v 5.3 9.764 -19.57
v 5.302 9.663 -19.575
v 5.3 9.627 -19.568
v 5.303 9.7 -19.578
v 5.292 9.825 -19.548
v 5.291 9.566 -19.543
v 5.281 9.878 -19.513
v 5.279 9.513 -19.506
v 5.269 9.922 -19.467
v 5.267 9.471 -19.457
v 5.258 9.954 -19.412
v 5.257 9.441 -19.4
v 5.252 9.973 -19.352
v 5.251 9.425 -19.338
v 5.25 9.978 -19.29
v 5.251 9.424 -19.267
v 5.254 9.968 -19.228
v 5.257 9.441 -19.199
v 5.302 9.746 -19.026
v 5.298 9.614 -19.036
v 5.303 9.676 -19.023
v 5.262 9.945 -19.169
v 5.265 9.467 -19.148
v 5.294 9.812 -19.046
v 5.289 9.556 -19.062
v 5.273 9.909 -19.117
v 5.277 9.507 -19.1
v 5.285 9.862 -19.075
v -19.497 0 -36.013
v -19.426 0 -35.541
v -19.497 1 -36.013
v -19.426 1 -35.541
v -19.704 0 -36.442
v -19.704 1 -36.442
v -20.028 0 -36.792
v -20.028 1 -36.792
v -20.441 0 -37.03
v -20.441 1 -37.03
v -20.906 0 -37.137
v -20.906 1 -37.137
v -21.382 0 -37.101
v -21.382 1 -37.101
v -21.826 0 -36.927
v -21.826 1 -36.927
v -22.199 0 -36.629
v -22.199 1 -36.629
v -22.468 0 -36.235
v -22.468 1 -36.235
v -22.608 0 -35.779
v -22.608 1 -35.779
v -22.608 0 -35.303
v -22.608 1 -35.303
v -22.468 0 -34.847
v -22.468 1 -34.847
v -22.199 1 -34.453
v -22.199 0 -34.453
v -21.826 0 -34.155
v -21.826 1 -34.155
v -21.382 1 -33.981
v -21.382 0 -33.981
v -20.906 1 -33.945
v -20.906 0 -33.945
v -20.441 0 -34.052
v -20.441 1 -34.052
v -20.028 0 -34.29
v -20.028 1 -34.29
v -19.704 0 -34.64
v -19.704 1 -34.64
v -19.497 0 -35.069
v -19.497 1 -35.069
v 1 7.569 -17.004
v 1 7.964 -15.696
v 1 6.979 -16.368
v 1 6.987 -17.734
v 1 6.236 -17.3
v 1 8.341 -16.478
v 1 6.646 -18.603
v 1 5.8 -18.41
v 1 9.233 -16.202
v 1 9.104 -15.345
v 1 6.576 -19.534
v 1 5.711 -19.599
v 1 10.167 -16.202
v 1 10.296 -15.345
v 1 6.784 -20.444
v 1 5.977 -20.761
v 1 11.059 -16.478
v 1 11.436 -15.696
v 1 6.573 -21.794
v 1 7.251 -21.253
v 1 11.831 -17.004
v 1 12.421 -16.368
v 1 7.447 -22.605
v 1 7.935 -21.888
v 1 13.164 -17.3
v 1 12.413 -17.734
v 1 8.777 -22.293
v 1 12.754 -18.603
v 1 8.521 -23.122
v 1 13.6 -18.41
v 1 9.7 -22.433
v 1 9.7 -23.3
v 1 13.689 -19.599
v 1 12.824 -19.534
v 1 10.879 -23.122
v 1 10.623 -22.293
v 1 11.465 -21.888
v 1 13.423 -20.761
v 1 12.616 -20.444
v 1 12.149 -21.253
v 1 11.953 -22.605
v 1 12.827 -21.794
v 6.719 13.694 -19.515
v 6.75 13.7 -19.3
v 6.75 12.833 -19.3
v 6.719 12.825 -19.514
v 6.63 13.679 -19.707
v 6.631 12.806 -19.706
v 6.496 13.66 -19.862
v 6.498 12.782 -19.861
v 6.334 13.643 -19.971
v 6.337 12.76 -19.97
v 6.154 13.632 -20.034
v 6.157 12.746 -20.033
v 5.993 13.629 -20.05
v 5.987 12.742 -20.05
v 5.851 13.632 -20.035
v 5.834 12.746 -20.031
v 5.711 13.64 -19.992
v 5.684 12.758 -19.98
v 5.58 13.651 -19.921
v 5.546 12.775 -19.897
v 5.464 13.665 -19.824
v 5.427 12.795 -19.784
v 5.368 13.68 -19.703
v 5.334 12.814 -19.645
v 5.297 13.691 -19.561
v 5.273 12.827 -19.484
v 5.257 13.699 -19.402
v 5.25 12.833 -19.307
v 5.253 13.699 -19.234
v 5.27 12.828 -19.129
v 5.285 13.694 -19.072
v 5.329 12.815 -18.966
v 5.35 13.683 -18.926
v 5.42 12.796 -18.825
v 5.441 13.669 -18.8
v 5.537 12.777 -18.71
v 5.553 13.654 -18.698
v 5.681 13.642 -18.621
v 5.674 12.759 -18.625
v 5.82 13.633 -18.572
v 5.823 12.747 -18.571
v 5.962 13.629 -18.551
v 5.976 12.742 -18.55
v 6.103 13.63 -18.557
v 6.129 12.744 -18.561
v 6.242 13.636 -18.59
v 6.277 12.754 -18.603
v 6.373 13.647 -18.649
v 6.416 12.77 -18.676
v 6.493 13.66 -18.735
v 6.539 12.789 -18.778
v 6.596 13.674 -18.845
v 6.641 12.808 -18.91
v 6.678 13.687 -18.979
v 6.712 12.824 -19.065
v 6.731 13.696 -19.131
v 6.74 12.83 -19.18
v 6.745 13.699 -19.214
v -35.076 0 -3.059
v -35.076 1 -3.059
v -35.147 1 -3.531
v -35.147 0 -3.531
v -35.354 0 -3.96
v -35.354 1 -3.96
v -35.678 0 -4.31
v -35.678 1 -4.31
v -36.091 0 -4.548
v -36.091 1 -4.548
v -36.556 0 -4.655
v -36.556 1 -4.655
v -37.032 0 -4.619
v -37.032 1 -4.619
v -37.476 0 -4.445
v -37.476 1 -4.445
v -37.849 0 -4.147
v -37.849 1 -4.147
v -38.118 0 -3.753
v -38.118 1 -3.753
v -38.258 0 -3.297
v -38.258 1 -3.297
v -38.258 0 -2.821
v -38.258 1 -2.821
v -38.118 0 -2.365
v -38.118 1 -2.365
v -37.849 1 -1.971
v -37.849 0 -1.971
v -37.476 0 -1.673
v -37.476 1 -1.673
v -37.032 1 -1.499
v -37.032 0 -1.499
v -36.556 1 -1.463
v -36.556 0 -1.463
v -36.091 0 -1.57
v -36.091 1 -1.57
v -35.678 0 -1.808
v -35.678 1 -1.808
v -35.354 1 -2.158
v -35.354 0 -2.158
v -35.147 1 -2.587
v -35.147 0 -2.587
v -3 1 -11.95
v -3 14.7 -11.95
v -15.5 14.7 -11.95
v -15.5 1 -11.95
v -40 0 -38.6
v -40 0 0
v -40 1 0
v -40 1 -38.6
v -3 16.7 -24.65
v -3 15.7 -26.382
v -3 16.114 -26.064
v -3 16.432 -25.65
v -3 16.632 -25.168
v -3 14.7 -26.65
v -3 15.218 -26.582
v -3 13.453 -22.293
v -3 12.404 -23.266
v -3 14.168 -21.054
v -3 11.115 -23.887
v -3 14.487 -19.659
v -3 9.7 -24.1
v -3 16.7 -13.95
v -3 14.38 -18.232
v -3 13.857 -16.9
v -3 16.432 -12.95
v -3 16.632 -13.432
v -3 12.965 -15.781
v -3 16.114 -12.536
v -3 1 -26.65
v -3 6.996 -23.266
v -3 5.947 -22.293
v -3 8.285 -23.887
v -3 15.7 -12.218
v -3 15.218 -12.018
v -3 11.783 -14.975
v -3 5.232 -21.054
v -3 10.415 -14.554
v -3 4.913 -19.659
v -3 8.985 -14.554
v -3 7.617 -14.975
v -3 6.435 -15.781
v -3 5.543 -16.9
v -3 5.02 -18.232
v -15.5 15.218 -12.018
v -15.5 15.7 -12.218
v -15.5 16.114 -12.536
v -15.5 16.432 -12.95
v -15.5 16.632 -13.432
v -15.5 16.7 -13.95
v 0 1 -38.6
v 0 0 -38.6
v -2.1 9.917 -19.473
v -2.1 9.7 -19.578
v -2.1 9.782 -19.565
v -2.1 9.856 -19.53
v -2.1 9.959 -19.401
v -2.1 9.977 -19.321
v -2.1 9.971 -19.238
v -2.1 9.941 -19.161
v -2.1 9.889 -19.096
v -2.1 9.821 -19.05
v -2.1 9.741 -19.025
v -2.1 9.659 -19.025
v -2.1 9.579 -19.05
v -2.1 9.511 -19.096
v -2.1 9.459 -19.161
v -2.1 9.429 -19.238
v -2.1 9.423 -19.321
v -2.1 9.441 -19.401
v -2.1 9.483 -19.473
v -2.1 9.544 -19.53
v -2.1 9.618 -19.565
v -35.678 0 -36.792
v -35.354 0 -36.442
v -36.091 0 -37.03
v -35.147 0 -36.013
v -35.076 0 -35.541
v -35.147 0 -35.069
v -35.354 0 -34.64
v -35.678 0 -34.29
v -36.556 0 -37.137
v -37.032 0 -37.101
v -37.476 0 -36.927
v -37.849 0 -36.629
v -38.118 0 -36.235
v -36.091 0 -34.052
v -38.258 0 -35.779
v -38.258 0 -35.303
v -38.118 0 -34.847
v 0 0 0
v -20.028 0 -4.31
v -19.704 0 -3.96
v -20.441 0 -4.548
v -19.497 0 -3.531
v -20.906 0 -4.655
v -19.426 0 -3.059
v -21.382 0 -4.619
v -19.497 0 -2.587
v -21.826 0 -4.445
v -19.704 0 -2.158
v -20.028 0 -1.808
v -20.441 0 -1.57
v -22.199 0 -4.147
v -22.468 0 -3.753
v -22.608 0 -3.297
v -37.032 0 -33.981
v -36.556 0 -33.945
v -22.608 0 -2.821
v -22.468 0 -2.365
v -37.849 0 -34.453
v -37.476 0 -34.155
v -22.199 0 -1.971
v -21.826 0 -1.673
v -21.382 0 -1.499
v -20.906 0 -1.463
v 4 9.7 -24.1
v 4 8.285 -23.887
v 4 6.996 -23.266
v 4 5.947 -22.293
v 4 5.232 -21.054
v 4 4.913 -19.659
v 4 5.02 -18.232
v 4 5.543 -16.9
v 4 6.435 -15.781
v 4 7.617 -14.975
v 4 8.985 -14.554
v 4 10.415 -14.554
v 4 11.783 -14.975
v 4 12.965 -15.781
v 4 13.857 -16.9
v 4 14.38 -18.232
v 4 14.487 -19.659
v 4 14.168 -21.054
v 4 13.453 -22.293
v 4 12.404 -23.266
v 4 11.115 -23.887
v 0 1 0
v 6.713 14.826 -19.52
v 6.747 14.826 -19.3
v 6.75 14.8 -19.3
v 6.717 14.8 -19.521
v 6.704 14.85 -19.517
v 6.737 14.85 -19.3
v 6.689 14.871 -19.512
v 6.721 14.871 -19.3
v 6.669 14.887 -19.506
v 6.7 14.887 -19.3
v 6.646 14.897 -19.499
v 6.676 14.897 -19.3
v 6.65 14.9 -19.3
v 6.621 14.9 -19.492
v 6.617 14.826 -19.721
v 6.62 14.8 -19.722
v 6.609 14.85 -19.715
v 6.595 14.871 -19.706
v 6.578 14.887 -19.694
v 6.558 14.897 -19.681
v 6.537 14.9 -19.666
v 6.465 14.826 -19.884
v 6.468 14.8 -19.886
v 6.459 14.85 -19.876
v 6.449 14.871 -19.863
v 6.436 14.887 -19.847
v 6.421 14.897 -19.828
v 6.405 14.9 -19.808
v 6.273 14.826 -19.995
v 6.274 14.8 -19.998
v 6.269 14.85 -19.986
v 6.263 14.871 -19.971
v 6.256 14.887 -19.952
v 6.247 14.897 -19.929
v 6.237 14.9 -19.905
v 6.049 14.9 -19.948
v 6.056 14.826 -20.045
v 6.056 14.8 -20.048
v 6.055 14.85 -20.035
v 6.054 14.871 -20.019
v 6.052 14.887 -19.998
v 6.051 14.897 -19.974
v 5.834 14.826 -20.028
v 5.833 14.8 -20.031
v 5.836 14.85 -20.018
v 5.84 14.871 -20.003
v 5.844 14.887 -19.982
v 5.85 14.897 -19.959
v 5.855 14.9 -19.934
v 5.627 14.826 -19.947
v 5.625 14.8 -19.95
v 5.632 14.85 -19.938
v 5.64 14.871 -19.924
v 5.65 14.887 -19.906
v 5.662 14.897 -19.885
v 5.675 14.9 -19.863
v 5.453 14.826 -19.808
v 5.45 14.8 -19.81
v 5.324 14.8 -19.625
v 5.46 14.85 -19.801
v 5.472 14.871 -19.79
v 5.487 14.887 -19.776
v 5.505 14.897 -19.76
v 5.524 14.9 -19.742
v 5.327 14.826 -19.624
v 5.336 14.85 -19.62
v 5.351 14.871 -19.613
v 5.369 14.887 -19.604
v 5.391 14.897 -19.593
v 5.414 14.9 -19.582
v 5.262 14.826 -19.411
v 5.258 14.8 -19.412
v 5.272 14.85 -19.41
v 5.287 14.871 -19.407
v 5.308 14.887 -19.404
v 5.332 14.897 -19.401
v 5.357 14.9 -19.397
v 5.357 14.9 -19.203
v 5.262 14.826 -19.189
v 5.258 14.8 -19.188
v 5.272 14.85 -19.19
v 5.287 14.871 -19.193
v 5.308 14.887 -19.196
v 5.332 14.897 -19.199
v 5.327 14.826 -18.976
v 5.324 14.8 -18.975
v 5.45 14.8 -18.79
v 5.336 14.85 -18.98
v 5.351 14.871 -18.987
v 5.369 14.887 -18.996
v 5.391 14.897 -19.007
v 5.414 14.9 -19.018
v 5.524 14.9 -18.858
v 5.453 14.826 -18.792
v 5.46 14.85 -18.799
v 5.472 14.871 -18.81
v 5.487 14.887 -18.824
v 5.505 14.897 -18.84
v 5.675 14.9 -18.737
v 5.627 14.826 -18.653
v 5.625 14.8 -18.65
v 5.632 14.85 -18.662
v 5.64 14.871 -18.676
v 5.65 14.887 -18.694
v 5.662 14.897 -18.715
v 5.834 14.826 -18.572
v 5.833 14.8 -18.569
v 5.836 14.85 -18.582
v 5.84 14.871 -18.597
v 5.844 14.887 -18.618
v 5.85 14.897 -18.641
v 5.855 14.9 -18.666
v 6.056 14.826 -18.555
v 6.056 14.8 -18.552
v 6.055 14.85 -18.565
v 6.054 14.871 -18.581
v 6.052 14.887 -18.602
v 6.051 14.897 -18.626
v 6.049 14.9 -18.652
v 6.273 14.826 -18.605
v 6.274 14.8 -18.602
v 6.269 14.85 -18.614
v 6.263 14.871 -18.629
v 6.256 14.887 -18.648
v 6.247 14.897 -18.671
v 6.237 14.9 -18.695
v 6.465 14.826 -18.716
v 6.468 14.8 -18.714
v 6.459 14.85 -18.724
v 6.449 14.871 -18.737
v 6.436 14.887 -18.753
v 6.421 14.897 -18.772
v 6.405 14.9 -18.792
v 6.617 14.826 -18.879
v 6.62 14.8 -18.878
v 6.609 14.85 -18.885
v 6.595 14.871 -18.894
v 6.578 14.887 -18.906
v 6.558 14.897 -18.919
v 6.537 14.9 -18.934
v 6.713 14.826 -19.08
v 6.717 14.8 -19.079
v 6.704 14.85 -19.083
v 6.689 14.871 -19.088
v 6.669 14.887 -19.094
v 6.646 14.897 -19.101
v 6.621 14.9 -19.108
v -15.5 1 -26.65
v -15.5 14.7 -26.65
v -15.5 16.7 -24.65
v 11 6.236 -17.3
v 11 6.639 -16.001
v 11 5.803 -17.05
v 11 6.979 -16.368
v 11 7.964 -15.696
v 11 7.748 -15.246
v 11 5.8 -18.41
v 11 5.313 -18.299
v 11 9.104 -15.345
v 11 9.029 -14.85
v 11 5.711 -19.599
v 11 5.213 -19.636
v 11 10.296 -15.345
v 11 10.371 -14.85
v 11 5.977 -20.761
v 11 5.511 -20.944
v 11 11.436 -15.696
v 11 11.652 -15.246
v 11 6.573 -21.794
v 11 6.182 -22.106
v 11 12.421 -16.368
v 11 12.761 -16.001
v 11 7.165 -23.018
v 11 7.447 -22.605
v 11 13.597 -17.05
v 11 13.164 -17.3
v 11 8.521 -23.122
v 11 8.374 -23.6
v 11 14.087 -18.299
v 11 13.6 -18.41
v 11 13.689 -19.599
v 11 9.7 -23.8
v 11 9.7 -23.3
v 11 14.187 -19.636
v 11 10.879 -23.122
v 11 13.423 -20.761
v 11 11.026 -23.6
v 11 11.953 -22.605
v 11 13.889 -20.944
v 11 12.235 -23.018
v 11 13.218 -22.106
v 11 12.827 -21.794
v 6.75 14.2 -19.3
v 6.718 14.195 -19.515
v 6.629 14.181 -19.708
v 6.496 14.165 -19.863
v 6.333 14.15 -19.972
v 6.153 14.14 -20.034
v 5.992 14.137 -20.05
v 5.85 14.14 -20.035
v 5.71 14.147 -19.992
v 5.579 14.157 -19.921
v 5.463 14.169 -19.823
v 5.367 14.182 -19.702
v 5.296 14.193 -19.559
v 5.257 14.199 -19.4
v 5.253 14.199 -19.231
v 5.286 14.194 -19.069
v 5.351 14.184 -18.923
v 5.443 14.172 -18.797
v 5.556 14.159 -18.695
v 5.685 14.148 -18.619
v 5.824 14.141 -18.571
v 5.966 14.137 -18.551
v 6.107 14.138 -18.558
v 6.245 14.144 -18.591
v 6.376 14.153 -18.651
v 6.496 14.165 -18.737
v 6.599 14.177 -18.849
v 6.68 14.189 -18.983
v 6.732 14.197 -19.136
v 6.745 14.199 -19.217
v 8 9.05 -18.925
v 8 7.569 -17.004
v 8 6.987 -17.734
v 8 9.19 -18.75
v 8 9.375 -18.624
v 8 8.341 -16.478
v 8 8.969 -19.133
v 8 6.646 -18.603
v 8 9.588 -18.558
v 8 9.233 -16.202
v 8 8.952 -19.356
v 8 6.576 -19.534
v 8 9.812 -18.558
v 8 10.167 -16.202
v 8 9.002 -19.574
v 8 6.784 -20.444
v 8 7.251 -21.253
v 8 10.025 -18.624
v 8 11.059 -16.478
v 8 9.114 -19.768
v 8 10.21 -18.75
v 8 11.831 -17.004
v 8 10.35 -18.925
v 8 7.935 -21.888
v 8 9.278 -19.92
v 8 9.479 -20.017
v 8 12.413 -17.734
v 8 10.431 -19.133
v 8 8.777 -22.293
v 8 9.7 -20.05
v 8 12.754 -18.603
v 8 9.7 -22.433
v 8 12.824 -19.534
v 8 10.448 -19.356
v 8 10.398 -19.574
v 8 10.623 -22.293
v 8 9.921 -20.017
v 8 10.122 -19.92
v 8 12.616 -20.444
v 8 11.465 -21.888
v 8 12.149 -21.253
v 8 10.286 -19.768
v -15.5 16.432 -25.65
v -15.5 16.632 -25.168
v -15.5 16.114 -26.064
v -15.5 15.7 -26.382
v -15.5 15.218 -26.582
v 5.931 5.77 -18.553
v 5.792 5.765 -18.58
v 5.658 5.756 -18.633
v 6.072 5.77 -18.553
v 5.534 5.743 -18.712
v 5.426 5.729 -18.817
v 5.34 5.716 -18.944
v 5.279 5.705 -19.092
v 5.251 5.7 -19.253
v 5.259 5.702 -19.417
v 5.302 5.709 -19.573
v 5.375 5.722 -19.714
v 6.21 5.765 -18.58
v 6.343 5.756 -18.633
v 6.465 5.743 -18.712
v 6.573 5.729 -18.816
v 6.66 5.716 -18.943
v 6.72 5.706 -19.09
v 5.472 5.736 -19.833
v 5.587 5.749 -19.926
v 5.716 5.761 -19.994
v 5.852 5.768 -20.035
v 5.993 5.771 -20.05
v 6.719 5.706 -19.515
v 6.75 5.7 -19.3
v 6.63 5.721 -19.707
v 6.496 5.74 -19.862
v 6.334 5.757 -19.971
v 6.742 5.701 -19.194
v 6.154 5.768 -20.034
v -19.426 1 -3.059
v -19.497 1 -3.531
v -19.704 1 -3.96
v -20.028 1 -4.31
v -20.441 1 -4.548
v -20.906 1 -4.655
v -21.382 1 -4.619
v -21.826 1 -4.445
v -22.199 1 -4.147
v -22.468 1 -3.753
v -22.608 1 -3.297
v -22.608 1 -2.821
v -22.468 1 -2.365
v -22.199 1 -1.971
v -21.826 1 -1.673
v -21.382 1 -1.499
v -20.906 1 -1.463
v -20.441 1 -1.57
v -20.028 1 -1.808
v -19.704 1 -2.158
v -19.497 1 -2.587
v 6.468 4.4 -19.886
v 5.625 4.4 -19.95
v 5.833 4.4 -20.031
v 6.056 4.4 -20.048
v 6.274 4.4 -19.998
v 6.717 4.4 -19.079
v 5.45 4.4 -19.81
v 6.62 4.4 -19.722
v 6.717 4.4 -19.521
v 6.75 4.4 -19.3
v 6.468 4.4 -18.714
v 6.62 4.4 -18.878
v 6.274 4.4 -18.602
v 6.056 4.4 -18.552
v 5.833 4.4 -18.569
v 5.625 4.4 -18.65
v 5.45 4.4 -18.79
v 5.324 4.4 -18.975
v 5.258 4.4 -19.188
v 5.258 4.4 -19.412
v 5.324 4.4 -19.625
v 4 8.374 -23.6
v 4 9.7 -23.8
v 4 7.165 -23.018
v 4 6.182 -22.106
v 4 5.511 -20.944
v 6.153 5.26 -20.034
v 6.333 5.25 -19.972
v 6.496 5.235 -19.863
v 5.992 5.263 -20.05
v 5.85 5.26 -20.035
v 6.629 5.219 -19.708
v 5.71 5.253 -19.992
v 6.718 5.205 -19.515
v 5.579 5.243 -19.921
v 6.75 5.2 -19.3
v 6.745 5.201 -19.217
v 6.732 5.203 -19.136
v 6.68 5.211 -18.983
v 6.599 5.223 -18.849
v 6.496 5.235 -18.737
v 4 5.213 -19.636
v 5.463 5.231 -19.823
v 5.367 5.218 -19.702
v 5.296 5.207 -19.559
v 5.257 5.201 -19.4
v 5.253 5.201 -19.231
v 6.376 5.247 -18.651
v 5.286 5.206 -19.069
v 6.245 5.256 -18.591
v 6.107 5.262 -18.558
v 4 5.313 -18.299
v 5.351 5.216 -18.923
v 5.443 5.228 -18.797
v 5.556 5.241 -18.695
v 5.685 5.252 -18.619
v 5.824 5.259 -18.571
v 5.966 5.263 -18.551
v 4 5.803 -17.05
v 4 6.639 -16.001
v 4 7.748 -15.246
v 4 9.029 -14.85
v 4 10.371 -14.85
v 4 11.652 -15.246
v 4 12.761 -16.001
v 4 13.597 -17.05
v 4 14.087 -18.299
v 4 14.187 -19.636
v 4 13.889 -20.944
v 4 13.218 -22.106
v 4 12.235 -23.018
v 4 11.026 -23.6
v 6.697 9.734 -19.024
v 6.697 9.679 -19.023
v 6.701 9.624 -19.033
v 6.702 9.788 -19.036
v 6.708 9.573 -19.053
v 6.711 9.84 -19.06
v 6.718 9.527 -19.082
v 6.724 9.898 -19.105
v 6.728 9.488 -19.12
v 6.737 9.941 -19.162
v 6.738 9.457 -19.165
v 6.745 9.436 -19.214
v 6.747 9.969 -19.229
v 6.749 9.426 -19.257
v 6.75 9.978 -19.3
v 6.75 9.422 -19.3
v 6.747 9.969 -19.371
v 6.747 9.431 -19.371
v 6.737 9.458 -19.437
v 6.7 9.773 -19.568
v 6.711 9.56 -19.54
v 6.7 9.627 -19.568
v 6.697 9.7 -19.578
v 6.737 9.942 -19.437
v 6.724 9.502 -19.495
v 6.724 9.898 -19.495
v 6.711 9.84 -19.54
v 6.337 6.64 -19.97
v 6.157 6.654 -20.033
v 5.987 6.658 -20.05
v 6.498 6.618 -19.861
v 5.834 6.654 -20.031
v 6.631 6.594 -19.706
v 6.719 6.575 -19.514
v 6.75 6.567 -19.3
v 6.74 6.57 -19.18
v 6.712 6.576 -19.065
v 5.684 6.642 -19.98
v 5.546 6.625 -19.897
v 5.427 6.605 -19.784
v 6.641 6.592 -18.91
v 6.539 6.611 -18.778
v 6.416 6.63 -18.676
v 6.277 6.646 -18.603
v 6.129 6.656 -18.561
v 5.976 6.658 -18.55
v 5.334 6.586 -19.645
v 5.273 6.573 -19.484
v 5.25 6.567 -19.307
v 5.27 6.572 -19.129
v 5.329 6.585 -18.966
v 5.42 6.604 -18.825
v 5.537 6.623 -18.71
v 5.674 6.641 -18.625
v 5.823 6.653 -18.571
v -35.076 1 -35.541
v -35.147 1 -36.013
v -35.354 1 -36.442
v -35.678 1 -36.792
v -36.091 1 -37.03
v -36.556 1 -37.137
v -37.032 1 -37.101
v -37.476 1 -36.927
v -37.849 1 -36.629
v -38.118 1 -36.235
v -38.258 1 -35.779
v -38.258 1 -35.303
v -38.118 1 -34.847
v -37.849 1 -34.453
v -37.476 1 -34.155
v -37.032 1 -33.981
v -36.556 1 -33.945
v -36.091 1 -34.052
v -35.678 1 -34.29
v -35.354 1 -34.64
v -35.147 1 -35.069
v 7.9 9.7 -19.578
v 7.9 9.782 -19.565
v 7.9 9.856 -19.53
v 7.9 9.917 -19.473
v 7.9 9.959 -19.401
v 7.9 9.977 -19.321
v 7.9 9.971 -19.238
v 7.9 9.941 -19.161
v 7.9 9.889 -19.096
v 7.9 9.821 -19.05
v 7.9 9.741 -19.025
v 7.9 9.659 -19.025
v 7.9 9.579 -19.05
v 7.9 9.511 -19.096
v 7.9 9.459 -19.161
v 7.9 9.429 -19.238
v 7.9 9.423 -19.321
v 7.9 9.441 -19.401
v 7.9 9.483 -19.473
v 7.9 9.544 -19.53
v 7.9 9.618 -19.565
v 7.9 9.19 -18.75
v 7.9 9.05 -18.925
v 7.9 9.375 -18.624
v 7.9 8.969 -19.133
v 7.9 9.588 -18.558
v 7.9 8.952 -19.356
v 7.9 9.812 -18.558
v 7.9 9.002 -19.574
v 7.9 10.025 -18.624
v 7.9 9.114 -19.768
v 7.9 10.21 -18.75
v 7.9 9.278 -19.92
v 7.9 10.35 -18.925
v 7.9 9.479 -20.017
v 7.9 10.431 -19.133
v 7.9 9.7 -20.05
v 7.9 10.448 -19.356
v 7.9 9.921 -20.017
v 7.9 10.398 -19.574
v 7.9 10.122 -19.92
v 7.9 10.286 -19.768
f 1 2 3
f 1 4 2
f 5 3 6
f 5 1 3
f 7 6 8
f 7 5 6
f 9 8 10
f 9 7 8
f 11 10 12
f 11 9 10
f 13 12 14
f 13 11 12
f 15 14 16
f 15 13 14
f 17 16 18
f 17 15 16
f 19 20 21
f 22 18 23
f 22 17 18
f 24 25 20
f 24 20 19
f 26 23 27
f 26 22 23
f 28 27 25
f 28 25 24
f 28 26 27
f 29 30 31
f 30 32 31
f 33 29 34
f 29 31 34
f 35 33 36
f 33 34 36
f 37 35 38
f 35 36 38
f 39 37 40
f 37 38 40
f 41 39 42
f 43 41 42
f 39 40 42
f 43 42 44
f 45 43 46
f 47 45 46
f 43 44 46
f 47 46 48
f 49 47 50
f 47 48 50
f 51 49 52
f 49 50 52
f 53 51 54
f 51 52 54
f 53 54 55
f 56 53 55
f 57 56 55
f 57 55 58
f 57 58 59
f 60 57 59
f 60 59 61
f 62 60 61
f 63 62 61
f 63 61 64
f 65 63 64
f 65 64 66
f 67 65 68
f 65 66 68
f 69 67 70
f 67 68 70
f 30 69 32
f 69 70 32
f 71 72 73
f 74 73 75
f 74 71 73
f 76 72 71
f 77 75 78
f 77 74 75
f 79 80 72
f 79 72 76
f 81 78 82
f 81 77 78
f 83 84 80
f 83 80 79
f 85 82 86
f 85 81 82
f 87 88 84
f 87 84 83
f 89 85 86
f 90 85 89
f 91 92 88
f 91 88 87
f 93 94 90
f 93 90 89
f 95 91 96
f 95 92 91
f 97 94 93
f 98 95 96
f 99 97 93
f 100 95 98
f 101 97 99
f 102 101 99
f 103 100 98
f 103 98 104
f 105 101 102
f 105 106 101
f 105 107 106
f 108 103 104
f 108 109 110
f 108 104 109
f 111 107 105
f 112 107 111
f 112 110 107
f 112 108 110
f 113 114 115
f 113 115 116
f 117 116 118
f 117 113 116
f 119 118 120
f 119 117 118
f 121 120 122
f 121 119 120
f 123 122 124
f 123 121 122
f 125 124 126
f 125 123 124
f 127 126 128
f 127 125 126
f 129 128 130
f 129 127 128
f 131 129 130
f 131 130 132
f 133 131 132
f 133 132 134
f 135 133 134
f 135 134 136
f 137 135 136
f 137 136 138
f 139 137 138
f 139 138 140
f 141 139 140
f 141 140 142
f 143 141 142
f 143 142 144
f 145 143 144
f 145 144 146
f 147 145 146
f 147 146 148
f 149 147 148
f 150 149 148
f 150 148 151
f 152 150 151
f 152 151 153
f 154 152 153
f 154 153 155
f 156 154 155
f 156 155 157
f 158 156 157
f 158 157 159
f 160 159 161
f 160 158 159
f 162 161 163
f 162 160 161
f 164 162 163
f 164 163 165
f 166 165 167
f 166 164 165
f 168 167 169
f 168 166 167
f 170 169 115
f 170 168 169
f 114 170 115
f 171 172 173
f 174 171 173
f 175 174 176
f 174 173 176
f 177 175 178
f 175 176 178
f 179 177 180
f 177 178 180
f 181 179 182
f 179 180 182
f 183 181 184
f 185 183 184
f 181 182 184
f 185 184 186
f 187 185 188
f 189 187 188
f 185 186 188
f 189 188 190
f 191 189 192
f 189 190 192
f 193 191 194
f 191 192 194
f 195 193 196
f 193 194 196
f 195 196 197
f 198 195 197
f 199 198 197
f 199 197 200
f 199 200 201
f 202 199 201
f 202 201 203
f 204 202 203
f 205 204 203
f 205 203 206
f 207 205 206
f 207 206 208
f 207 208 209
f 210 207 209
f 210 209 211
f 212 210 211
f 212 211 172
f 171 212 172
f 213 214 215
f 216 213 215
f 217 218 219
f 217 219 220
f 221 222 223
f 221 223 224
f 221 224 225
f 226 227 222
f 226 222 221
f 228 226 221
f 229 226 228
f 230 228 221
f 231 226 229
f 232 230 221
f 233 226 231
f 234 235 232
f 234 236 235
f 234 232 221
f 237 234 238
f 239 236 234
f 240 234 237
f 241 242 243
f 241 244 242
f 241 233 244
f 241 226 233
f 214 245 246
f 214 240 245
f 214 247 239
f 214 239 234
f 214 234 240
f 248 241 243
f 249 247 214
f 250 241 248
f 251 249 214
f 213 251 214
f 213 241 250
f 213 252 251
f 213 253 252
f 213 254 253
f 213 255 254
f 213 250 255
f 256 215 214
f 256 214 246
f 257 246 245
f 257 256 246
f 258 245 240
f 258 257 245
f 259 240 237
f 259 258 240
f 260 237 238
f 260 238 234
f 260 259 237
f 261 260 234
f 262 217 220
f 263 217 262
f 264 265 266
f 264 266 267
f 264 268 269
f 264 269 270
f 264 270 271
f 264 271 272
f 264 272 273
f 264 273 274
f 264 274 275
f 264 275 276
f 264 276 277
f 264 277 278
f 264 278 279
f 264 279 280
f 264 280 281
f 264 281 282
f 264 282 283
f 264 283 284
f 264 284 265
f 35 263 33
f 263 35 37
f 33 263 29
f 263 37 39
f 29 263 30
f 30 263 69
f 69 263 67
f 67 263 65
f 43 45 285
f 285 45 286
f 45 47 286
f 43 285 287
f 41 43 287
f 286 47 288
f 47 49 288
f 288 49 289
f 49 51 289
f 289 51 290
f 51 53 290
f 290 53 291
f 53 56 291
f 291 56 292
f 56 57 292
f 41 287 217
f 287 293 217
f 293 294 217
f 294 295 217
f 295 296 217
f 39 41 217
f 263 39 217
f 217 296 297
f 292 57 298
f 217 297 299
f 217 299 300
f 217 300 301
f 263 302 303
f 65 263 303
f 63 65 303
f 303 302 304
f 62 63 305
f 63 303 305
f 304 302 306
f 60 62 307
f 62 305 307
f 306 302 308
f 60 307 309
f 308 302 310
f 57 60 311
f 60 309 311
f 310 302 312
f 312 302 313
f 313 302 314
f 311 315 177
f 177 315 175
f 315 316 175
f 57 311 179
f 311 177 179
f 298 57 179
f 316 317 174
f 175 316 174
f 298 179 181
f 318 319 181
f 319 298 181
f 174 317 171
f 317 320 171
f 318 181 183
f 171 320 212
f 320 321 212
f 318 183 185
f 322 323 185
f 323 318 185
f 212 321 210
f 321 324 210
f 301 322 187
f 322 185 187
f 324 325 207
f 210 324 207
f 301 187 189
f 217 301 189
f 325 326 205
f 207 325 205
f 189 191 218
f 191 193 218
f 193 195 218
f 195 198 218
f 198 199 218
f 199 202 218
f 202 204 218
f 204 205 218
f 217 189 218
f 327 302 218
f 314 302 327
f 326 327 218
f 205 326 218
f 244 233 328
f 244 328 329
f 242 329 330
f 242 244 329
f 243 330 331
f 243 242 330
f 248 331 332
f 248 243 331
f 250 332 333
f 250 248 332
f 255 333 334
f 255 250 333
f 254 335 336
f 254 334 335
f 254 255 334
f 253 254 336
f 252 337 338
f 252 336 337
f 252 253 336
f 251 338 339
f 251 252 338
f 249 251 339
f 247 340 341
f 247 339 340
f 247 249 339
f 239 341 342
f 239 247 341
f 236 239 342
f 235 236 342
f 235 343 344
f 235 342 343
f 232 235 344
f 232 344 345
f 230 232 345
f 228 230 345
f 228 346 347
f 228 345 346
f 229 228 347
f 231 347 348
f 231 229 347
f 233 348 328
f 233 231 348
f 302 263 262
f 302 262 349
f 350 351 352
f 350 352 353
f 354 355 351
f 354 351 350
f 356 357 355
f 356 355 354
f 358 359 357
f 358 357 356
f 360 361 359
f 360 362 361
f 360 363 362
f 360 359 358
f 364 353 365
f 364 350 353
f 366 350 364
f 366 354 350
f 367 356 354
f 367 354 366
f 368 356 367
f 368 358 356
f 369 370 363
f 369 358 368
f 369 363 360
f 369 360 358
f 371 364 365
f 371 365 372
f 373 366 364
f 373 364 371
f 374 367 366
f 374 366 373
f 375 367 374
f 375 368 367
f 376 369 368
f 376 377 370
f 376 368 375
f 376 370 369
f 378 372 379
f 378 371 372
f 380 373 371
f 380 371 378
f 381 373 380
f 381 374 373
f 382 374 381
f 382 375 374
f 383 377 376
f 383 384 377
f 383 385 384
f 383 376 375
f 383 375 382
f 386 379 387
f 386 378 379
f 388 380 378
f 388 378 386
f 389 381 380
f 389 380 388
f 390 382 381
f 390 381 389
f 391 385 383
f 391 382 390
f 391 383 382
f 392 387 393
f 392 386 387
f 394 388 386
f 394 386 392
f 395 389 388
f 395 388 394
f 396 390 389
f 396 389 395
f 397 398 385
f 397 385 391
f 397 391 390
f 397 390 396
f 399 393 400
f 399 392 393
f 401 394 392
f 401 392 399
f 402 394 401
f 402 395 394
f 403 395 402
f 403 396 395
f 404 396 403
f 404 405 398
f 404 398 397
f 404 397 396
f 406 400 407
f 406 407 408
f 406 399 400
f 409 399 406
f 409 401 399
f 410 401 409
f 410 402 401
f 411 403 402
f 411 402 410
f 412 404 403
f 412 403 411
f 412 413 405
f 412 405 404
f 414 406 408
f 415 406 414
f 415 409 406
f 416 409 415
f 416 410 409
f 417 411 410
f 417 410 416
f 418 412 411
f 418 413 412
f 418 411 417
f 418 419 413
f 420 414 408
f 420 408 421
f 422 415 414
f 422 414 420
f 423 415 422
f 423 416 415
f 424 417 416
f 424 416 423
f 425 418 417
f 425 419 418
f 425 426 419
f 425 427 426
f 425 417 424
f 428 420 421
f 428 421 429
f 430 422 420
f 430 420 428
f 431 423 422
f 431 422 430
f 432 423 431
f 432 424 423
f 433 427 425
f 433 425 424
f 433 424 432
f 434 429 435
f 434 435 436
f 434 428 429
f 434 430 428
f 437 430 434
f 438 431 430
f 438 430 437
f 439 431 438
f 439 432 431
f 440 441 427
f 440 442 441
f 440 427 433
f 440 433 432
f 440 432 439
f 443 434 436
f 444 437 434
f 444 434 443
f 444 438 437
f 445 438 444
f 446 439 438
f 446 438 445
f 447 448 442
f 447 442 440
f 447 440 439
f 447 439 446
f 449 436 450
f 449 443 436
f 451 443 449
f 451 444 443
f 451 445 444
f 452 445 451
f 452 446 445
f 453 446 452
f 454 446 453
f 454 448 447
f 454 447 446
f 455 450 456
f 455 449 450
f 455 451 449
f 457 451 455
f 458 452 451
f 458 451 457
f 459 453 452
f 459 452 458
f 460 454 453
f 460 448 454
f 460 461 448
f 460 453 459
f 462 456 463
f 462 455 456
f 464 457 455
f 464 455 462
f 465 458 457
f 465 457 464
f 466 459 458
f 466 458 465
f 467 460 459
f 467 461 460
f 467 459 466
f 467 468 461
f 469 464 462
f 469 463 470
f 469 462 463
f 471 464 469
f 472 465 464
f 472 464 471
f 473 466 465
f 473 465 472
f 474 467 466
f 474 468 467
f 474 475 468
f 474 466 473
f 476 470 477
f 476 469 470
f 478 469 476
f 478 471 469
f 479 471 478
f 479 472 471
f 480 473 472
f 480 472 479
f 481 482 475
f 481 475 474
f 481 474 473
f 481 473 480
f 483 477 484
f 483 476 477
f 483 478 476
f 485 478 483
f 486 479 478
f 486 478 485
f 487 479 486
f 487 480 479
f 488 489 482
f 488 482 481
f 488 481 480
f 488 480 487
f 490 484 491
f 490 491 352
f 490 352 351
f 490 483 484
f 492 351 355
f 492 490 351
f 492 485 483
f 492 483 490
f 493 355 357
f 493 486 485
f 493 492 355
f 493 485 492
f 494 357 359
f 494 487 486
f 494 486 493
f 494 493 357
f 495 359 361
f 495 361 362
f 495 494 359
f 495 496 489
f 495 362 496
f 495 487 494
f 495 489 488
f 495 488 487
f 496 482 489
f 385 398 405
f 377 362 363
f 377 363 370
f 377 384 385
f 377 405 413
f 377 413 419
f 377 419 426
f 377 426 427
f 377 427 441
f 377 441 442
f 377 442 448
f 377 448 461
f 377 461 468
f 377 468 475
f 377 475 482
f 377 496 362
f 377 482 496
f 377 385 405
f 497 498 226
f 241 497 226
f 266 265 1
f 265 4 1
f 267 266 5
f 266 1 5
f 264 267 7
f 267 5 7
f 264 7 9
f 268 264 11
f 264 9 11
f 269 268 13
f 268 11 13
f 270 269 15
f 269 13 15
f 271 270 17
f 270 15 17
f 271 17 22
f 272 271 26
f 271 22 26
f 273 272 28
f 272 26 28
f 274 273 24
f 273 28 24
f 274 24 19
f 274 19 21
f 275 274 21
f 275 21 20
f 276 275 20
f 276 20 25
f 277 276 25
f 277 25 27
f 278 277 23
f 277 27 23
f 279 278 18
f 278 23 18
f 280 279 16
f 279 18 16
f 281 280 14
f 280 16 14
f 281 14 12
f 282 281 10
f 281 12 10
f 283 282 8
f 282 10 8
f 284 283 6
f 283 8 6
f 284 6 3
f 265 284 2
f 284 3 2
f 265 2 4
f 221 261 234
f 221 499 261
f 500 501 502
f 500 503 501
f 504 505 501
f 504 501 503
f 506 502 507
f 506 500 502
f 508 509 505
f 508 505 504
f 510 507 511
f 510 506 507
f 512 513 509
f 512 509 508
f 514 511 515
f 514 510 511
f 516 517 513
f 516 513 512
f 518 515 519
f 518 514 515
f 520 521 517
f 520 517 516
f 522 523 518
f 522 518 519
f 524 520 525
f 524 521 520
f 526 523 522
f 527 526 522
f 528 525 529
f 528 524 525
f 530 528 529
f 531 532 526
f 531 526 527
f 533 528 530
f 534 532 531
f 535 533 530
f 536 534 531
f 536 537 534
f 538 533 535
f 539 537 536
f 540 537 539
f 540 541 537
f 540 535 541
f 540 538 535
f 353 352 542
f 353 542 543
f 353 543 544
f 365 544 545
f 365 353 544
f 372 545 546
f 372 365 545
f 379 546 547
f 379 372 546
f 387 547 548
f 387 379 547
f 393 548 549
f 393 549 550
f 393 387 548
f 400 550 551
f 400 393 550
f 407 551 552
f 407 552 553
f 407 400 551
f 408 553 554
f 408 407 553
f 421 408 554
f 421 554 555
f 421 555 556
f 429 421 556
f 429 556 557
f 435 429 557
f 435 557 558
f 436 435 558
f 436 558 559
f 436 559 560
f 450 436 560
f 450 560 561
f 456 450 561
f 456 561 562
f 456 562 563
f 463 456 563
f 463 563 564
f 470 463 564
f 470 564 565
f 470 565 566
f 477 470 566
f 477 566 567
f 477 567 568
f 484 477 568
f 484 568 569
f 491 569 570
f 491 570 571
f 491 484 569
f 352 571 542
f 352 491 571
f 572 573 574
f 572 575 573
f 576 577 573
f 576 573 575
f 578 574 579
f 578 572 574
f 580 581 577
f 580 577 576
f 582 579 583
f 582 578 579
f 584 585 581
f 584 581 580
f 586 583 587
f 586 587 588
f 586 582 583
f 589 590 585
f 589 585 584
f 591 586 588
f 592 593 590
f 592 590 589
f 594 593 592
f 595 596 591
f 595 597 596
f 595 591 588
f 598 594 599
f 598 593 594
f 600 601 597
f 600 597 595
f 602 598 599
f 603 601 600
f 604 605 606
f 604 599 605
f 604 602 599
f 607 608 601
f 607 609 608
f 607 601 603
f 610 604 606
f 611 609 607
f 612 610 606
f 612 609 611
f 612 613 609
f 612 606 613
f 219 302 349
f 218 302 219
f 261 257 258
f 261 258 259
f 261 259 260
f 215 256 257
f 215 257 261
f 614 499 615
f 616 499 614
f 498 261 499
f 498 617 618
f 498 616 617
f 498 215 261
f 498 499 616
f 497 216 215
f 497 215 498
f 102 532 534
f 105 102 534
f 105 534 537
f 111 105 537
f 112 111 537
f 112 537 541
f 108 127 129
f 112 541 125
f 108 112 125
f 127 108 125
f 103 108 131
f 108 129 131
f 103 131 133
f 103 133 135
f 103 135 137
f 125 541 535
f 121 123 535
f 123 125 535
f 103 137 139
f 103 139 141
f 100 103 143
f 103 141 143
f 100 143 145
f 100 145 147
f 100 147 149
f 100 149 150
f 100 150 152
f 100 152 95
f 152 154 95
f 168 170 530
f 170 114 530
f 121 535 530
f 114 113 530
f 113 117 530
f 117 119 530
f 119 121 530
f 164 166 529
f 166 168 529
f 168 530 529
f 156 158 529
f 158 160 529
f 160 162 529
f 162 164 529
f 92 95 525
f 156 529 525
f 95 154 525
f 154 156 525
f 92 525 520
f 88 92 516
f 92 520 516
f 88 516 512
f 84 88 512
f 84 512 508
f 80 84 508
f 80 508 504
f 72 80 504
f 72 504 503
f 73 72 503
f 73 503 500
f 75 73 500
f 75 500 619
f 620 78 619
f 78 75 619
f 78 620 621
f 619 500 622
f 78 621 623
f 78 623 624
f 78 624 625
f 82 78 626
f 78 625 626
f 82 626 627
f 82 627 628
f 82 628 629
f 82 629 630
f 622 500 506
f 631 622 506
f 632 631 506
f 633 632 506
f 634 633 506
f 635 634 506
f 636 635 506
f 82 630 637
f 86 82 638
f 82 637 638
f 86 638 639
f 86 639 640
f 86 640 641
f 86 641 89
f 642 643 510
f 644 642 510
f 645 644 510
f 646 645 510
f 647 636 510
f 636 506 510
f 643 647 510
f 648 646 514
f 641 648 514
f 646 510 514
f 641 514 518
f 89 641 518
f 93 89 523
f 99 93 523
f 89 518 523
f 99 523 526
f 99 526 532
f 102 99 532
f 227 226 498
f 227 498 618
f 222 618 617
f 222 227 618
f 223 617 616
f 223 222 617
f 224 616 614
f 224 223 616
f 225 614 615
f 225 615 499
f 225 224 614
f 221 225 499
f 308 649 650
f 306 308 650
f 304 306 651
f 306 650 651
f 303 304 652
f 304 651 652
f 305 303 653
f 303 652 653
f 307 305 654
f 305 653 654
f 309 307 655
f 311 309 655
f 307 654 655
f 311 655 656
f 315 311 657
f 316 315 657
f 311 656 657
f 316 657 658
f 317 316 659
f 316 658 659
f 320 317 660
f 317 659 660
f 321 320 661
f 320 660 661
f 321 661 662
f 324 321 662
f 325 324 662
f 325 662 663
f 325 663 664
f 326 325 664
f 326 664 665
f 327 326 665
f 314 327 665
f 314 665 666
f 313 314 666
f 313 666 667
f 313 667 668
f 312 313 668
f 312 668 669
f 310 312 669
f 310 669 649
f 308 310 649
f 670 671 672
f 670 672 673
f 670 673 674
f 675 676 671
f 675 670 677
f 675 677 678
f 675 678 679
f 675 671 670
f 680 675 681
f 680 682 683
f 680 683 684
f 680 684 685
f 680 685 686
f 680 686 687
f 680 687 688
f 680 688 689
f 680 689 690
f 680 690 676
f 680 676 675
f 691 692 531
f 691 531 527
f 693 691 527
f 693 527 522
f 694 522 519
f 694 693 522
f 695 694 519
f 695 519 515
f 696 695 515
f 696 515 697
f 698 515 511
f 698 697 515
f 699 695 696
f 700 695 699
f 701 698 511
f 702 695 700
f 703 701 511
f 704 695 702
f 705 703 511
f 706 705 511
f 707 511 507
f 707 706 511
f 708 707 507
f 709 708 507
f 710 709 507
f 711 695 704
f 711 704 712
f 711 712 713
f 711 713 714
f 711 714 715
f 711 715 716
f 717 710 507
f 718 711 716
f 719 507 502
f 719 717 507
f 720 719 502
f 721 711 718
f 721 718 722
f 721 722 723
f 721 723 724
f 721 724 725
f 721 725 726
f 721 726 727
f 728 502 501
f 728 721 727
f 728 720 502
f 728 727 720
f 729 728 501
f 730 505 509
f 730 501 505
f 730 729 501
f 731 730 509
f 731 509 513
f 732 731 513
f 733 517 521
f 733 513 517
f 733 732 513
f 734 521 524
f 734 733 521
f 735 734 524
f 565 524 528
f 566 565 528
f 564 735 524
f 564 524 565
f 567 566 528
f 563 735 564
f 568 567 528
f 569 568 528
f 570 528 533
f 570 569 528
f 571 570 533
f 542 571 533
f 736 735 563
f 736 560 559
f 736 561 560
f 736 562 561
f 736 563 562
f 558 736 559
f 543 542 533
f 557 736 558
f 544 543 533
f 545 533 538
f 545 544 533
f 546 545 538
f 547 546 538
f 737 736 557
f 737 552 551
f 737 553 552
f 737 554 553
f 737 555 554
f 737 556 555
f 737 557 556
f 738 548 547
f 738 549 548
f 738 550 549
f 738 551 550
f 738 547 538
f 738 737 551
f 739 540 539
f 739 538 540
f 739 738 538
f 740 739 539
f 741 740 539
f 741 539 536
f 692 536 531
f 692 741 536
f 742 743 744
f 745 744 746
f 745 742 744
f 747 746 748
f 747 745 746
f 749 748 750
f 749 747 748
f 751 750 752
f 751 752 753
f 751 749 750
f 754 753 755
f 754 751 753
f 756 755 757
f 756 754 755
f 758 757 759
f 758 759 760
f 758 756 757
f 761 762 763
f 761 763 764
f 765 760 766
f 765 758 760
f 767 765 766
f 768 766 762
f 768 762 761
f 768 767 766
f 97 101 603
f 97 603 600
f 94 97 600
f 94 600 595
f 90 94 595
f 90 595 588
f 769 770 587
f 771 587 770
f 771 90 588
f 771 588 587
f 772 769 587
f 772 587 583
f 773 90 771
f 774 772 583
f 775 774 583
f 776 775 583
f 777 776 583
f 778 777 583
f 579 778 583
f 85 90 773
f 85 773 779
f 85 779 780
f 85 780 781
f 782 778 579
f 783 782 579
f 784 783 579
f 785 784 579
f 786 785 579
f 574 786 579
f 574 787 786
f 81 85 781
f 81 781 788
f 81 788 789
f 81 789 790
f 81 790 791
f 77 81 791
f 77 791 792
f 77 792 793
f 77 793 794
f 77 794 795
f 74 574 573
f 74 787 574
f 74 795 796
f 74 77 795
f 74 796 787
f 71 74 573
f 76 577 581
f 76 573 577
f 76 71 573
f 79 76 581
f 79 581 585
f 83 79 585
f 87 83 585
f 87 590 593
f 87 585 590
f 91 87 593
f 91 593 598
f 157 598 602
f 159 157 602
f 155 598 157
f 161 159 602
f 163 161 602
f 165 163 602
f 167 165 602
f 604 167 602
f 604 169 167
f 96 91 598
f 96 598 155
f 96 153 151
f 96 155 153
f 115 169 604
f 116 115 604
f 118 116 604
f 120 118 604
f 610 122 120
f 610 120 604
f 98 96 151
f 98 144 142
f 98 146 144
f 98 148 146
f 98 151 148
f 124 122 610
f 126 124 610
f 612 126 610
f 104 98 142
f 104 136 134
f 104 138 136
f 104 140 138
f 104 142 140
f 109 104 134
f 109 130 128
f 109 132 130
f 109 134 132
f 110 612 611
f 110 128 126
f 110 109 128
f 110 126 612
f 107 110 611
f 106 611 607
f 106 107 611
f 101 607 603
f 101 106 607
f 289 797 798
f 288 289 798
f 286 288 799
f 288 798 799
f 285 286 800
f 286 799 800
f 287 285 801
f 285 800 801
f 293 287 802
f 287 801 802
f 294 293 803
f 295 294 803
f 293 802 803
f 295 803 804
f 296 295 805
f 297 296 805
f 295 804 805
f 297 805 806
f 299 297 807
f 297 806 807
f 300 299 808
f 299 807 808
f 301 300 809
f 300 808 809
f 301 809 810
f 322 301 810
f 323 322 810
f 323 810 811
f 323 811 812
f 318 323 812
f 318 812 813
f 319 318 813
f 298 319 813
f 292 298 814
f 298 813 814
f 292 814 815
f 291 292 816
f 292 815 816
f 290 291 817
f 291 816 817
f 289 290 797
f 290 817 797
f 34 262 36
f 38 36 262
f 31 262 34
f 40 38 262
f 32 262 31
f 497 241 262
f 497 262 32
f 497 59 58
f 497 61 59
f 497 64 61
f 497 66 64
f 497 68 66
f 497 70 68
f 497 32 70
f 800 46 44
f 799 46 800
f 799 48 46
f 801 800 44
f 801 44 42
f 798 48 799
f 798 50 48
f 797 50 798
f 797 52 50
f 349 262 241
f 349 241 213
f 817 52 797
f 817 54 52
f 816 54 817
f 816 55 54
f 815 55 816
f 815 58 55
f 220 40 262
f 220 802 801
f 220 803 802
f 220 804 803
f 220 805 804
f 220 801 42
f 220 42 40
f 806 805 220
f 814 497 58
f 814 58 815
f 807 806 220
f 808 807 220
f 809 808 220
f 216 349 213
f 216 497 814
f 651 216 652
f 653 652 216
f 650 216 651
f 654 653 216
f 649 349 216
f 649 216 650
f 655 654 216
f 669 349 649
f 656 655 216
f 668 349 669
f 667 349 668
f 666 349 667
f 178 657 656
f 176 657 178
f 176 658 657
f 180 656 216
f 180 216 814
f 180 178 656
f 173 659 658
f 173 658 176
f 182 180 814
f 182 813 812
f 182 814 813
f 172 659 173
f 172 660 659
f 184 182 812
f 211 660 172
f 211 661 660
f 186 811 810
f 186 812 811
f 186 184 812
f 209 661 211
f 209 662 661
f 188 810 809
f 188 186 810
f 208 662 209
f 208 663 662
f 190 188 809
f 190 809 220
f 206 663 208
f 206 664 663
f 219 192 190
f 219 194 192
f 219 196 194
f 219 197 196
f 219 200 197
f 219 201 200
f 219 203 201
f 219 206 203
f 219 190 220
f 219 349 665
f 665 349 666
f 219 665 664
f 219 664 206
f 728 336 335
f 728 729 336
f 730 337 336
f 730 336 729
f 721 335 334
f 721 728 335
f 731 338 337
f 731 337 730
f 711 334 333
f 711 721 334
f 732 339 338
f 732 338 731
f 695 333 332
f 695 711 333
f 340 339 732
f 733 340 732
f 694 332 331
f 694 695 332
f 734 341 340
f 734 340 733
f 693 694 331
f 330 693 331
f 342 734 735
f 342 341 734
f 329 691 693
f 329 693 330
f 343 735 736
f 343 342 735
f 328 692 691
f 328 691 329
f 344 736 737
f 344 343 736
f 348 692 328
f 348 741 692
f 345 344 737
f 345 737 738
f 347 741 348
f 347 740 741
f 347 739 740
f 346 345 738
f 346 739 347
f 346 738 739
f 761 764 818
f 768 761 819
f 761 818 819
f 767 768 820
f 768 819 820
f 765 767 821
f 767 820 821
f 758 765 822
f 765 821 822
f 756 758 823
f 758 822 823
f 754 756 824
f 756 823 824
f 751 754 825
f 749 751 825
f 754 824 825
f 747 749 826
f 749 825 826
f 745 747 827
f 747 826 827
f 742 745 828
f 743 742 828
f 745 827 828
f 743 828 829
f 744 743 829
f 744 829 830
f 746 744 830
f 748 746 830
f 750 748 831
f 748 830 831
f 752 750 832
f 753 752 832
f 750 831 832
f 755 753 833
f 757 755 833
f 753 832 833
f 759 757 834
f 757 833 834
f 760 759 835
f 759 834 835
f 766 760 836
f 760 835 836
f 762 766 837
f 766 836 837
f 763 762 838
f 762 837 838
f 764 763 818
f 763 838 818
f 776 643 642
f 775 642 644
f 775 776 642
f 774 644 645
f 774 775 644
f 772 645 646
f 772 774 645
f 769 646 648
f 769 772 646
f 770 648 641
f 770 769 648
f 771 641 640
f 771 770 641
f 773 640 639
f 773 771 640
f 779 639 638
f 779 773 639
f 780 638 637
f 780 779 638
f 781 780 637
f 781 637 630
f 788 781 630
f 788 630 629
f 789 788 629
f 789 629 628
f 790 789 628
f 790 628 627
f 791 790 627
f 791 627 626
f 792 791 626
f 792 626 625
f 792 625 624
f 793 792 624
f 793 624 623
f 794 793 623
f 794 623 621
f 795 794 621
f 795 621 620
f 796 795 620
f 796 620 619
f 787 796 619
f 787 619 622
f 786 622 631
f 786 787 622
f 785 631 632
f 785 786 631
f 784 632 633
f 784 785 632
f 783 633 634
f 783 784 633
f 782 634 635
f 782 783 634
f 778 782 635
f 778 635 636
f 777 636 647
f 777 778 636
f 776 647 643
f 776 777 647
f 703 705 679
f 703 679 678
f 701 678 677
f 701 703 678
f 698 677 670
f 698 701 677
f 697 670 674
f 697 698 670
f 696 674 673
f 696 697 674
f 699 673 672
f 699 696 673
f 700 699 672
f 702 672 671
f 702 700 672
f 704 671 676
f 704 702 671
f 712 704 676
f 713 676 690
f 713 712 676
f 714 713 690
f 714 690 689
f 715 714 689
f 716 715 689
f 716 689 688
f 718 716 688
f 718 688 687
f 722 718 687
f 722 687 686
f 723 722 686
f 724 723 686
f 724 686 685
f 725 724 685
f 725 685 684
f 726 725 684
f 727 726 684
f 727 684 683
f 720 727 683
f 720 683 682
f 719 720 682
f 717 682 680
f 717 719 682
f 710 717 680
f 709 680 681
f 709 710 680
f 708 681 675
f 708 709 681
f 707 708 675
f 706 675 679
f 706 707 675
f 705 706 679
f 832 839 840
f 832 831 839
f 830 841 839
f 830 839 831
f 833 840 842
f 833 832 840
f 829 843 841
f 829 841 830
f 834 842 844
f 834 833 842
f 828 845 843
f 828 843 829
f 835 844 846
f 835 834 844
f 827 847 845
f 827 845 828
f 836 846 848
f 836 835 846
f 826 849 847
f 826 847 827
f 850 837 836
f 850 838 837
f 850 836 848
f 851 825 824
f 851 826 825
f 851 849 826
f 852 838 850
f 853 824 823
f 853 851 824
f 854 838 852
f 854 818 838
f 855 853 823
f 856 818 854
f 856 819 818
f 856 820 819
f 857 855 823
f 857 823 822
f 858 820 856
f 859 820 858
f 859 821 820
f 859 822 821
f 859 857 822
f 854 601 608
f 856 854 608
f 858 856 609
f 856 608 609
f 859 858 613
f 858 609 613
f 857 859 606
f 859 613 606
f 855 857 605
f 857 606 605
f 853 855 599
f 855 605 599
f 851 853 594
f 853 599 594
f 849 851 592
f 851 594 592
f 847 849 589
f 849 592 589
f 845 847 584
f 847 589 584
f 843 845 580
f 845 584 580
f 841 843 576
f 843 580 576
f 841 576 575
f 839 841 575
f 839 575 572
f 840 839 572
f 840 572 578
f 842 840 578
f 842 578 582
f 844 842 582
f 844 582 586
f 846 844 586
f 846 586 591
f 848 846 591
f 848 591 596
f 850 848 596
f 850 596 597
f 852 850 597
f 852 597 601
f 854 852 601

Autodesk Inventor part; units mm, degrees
ref_plane "YZ Plane" through (0, 0, 0) normal (1, 0, 0) x (0, 1, 0)
ref_plane "XZ Plane" through (0, 0, 0) normal (0, 1, 0) x (-1, 0, 0)
ref_plane "XY Plane" through (0, 0, 0) normal (0, 0, 1) x (1, 0, 0)
sketch "Sketch1" plane through (0, 0, 0) normal (0, 1, 0) x (-1, 0, 0)
  line L0 (0, 0) -> (40, 0)
  line L1 (40, 0) -> (40, -38.6)
  line L2 (40, -38.6) -> (0, -38.6)
  line L3 (0, -38.6) -> (0, 0)
  dimension "d0" = 40
  dimension "d1" = 38.6
extrude "Extrusion1" add sketch "Sketch1" along normal blind 1
sketch "Sketch6" plane through (0, 1, 0) normal (0, 1, 0) x (1, 0, 0)
  circle A0 centre (-36.676, 3.059) radius 1.6
  circle A1 centre (-21.026, 3.059) radius 1.6
  circle A2 centre (-21.026, 35.541) radius 1.6
  circle A3 centre (-36.676, 35.541) radius 1.6
  line L0 (0, 38.6) -> (-40, 38.6) projected
  line L1 (-40, 38.6) -> (-40, 0) projected
  point P0 (0, 0)
  dimension "d35" = 3.2
  dimension "d36" = 3.2
  dimension "d37" = 3.2
  dimension "d38" = 3.2
  dimension "d39" = 15.65
  dimension "d40" = 15.65
  dimension "d41" = 32.482
  dimension "d42" = 0
  dimension "d43" = 0
  dimension "d44" = 0
  dimension "d45" = 3.059
  dimension "d46" = 3.324
extrude "Extrusion5" cut sketch "Sketch6" against normal blind 5
sketch "Sketch7" plane through (0, 1, 0) normal (0, 1, 0) x (1, 0, 0)
  line L0 (-15.5, 26.65) -> (-3, 26.65)
  line L1 (-3, 26.65) -> (-3, 11.95)
  line L2 (-3, 11.95) -> (-15.5, 11.95)
  line L3 (-15.5, 11.95) -> (-15.5, 26.65)
  line L4 (0, 38.6) -> (-40, 38.6) projected
  line L5 (0, 0) -> (0, 38.6) projected
  dimension "d49" = 12.5
  dimension "d50" = 14.7
  dimension "d51" = 11.95
  dimension "d52" = 3
extrude "Extrusion6" add sketch "Sketch7" along normal blind 15.7
sketch "Sketch9" plane through (-3, 1, -11.95) normal (1, 0, 0) x (0, 0, -1)
  circle A0 centre (7.35, 8.7) radius 4.8
  line L0 (14.7, 0) -> (14.7, 15.7) projected
  line L1 (0, 15.7) -> (14.7, 15.7) projected
  point P0 (-11.95, -1)
  dimension "d55" = 9.6
  dimension "d56" = 7.35
  dimension "d57" = 7
extrude "Extrusion7" add sketch "Sketch9" along normal blind 7
fillet "Fillet1" radius 2 2 edges at (-9.25, 16.7, -11.95) (-9.25, 16.7, -26.65)
sketch "Sketch10" plane through (4, 9.7, -19.3) normal (1, 0, 0) x (0, 0, -1)
  circle A0 centre (0, 0) radius 4.5
  line L0 (7.35, -8.7) -> (7.35, 5) projected
  line L1 (-5.35, 7) -> (5.35, 7) projected
  point P0 (-19.3, -9.7)
  dimension "d61" = 9
  dimension "d62" = 7.35
  dimension "d63" = 7
extrude "Extrusion8" add sketch "Sketch10" along normal blind 7
sketch "Sketch11" plane through (11, 9.7, -19.3) normal (1, 0, 0) x (0, 0, -1)
  circle A0 centre (0, 0) radius 4
  point P0 (-19.3, -9.7)
  dimension "d66" = 8
extrude "Extrusion9" cut sketch "Sketch11" against normal blind 10
sketch "Sketch12" plane through (1, 9.7, -19.3) normal (1, 0, 0) x (0, 0, -1)
  circle A0 centre (0, 0) radius 3.1326
  point P0 (-19.3, -9.7)
extrude "Extrusion10" add sketch "Sketch12" along normal blind 7
sketch "Sketch13" plane through (8, 9.7, -19.3) normal (1, 0, 0) x (0, 0, -1)
  circle A0 centre (0, 0) radius 0.75
  point P0 (-19.3, -9.7)
  dimension "d75" = 1.5
extrude "Extrusion11" cut sketch "Sketch13" against normal blind 0.1
sketch "Sketch14" plane through (7.9, 9.7, -19.3) normal (1, 0, 0) x (0, 0, -1)
  circle A0 centre (0, 0) radius 0.2778
  point P0 (-19.3, -9.7)
extrude "Extrusion12" cut sketch "Sketch14" against normal blind 10
sketch "Sketch15" plane through (0, 16.7, 0) normal (0, 1, 0) x (1, 0, 0)
  circle A0 centre (6, 19.3) radius 0.75
  line L0 (-3, 26.65) -> (-15.5, 26.65) projected
  line L1 (-3, 13.95) -> (-3, 24.65) projected
  point P0 (0, 0)
  dimension "d76" = 1.5
  dimension "d77" = 7.35
  dimension "d78" = 9
extrude "Extrusion13" add sketch "Sketch15" against normal blind 20
sketch "Sketch16" plane through (6, 16.7, -19.3) normal (0, 1, 0) x (1, 0, 0)
  circle A0 centre (0, 0) radius 0.75
  point P0 (-6, -19.3)
extrude "Extrusion14" cut sketch "Sketch16" against normal blind 1.8
sketch "Sketch17" plane through (6, -3.3, -19.3) normal (0, -1, 0) x (1, 0, 0)
  circle A0 centre (0, 0) radius 0.75
  point P0 (-6, 19.3)
extrude "Extrusion15" cut sketch "Sketch17" against normal blind 7.7
fillet "Fillet2" radius 0.1 1 edges at (5.25, 14.9, -19.3)
properties part number "LED8"
